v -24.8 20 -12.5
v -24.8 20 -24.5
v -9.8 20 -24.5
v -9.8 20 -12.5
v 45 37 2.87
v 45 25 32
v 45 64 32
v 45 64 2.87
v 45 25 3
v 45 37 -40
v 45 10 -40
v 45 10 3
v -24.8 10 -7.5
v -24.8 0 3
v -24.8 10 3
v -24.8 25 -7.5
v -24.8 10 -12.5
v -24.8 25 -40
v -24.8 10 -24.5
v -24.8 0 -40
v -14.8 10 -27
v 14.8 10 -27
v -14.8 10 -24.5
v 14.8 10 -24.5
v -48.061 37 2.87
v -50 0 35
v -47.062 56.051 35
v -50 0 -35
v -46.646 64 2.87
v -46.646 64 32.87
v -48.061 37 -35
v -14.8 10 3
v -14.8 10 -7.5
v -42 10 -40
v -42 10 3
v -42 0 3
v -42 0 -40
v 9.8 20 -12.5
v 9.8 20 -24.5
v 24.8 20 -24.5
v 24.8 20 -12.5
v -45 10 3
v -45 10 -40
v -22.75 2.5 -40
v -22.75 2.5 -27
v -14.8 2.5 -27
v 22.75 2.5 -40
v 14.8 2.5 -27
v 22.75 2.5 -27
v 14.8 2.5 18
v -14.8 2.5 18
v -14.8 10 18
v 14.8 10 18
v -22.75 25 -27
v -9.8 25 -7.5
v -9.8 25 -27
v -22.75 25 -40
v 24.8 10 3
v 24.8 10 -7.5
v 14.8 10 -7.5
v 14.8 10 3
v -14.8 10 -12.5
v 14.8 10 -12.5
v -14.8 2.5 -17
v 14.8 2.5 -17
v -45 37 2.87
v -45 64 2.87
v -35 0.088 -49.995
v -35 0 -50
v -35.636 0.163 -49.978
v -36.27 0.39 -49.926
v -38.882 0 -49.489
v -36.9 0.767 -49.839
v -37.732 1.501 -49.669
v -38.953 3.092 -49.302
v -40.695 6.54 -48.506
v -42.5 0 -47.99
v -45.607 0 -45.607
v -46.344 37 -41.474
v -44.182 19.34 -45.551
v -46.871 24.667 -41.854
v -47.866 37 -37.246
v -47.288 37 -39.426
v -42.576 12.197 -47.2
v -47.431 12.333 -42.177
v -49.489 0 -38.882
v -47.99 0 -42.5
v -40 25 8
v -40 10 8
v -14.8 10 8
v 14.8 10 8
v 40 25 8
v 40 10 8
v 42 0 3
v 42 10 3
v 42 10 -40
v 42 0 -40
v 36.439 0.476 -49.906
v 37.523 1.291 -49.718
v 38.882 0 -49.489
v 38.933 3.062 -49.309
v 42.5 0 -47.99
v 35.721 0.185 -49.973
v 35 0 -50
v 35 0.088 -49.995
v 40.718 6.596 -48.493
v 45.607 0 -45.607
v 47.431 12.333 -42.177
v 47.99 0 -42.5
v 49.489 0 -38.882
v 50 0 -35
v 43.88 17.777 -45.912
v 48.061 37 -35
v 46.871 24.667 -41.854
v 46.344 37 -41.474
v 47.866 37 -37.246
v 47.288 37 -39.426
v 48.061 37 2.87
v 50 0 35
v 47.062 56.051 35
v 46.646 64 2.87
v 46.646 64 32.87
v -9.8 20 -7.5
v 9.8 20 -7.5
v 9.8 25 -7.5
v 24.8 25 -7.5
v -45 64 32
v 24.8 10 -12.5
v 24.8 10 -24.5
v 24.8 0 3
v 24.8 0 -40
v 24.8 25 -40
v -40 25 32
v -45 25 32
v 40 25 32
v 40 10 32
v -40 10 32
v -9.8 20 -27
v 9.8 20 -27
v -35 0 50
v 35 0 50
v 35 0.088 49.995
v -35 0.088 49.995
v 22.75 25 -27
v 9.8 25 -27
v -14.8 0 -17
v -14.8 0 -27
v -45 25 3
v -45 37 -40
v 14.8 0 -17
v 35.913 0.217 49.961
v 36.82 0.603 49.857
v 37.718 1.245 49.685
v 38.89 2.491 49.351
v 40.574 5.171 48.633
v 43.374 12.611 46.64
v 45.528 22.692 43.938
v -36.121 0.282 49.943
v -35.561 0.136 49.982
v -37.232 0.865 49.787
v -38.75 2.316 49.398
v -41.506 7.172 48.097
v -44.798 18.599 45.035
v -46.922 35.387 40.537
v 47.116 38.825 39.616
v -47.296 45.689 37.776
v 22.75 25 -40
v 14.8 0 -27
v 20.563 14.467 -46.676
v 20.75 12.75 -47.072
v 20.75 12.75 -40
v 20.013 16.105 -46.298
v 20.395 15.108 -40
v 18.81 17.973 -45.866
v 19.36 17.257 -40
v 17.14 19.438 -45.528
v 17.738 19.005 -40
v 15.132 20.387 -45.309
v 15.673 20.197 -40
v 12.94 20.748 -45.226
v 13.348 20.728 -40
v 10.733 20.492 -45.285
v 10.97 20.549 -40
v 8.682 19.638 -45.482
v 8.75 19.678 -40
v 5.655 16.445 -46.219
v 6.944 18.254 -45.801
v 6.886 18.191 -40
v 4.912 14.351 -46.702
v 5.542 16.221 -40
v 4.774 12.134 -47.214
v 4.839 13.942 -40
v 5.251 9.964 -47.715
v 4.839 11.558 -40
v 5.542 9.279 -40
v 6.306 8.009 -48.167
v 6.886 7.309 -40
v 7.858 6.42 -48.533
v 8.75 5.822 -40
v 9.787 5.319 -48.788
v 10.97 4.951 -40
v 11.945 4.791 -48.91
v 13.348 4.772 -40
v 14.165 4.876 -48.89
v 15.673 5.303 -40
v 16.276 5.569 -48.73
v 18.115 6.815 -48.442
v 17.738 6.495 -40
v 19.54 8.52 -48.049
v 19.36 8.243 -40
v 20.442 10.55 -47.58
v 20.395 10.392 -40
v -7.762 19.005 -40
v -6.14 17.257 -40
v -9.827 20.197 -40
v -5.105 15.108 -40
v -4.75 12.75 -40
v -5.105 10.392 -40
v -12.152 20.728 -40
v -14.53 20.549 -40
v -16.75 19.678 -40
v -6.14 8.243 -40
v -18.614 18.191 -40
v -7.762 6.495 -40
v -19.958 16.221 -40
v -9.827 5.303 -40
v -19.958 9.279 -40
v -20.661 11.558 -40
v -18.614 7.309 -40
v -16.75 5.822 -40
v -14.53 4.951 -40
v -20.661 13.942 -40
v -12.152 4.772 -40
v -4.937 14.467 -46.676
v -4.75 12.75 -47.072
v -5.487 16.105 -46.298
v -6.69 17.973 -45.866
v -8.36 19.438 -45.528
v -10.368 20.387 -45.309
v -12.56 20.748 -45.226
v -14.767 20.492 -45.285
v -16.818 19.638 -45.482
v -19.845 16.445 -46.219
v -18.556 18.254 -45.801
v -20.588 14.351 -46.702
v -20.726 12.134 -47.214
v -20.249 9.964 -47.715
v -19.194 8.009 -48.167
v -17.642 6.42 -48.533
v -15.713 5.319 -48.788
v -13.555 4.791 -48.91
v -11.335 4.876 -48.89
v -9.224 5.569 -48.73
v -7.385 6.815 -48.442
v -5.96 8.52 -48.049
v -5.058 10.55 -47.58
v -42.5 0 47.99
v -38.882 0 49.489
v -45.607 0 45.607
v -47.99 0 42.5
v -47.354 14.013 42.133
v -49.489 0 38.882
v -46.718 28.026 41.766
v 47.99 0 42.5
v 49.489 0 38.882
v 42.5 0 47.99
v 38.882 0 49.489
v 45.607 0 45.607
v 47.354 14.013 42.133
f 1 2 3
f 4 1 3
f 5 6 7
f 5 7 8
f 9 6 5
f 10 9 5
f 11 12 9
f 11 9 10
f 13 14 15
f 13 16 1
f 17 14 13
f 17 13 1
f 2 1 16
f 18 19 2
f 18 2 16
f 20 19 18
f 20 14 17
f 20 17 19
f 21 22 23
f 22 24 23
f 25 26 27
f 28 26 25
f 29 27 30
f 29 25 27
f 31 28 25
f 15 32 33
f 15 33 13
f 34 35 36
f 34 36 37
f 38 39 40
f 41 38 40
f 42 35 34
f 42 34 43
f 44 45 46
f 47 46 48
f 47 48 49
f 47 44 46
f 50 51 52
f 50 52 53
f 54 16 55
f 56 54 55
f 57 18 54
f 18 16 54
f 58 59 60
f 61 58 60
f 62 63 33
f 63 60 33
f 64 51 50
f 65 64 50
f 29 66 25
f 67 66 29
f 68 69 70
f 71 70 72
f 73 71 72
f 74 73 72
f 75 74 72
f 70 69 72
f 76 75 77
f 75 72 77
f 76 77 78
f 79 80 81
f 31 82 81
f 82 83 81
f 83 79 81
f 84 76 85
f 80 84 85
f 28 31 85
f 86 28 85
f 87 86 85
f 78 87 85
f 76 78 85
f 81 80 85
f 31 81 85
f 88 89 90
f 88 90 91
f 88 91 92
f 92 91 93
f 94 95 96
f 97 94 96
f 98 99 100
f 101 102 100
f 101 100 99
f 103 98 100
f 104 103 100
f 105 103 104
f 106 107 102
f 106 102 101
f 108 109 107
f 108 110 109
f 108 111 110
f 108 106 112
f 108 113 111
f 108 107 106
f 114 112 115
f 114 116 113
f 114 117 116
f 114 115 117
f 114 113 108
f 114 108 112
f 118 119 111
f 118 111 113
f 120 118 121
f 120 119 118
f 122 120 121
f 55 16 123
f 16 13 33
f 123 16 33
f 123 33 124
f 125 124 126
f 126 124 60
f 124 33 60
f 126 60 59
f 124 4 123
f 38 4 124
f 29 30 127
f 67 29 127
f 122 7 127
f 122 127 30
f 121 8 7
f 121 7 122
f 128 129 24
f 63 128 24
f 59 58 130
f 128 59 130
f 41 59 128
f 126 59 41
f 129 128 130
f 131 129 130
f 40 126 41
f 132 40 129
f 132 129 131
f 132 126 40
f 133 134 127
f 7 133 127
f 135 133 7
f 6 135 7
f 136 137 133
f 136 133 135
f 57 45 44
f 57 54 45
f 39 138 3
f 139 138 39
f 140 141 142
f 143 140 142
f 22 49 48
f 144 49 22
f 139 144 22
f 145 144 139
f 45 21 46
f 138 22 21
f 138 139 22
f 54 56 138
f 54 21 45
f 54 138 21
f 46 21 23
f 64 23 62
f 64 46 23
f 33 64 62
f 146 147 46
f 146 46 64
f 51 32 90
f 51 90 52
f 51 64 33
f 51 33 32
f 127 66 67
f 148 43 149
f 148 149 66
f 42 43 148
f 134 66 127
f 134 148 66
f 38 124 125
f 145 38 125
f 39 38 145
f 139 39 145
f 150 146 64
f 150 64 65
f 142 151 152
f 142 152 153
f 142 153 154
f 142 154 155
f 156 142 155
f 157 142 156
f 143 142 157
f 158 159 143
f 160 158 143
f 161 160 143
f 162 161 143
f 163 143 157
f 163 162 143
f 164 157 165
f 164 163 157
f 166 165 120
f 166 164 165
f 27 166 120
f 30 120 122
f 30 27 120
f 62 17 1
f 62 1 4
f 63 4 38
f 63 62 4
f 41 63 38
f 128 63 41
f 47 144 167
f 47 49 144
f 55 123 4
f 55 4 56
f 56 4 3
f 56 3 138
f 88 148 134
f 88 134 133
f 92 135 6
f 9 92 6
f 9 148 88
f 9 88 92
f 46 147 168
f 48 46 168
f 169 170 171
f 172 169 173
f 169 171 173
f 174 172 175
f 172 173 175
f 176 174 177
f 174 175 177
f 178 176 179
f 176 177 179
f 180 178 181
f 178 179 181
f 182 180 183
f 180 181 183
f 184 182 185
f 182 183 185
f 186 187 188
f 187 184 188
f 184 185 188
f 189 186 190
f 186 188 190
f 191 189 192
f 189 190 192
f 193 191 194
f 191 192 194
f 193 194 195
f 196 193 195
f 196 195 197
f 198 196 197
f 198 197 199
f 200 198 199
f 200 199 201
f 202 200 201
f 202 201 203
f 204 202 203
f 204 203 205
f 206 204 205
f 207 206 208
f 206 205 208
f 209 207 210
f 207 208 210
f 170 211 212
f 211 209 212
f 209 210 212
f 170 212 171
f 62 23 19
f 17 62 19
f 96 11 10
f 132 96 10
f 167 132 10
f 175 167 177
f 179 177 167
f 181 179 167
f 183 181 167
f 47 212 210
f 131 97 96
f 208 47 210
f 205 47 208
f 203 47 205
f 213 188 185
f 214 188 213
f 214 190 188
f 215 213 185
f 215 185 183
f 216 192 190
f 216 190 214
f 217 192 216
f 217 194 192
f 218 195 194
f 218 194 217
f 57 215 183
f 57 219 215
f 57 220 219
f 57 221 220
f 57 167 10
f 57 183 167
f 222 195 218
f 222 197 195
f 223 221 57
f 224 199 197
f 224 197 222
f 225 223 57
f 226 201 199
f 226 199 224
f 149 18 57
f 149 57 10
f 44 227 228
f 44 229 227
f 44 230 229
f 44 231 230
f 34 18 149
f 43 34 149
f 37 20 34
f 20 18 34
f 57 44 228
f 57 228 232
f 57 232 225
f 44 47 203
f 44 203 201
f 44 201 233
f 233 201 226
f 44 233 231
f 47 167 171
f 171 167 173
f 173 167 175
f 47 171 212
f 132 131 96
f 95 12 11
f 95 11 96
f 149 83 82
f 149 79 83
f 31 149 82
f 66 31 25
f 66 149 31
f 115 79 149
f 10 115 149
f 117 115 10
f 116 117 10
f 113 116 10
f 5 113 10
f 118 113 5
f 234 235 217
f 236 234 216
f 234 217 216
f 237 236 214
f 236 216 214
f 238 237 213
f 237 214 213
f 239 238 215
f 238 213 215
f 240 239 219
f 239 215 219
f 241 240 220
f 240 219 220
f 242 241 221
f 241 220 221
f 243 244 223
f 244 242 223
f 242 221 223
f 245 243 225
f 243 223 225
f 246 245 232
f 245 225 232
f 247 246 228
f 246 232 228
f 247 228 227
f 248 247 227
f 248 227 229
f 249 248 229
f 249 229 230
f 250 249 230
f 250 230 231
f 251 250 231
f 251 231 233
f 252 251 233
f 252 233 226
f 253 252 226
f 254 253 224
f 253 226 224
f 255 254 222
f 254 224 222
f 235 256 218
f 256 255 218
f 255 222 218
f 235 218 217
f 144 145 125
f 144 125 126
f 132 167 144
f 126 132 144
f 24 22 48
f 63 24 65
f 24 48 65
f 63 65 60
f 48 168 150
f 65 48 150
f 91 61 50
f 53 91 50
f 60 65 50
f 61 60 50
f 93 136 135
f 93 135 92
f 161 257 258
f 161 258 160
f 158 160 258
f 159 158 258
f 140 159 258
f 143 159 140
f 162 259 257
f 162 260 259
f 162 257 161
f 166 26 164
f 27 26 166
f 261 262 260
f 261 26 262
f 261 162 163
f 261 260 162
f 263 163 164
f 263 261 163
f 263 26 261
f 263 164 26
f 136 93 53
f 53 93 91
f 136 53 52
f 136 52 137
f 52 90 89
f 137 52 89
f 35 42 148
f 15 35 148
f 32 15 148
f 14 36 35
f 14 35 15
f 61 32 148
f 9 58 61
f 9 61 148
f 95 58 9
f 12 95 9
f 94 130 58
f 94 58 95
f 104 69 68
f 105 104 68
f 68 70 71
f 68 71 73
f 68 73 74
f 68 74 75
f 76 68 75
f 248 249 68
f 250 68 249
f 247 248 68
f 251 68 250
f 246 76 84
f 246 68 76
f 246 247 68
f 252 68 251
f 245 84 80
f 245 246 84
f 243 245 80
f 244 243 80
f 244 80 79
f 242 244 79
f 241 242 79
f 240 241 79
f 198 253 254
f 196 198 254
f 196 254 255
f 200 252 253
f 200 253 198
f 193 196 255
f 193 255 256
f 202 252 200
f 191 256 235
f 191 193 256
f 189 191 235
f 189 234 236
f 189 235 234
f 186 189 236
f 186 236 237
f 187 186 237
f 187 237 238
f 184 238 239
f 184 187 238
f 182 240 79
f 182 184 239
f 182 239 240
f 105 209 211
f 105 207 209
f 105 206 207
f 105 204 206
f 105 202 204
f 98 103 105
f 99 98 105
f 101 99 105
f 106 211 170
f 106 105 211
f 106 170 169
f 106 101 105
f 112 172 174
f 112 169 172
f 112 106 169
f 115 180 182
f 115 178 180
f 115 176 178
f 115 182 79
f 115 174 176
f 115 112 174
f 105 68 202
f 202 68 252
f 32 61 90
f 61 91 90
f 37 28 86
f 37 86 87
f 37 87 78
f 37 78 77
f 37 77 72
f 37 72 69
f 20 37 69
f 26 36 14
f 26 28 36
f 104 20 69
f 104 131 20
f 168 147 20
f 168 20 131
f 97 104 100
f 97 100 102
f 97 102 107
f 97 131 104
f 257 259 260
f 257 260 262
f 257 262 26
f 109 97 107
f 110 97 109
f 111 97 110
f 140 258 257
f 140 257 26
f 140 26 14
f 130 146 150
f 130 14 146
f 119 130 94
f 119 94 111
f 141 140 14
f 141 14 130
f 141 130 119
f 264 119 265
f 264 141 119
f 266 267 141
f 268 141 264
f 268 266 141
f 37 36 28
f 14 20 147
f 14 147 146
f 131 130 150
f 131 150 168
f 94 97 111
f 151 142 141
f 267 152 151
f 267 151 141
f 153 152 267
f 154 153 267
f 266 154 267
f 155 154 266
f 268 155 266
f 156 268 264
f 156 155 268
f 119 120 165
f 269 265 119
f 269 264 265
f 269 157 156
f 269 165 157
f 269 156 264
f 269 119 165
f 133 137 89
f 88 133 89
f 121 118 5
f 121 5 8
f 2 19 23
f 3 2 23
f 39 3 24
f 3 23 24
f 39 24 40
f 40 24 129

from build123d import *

# Parameters (mm, degrees)
BOSS_EXTRUDE1_DEPTH     = 10
SKETCH2_W               = 17.2
SKETCH2_H               = 43
CUT_EXTRUDE1_DEPTH      = 72.414284285
SKETCH3_W               = 90
SKETCH3_H               = 34
SKETCH3_W_2             = 80
SKETCH3_H_2             = 24
BOSS_EXTRUDE3_DEPTH     = 15
SKETCH4_W               = 49.6
SKETCH4_H               = 5
BOSS_EXTRUDE4_DEPTH     = 10
SKETCH5_W               = 15
SKETCH5_H               = 22
BOSS_EXTRUDE5_DEPTH     = 5
SKETCH6_W               = 90
SKETCH6_H               = 77
BOSS_EXTRUDE6_DEPTH     = 15
BOSS_EXTRUDE8_DEPTH     = 39
CHAMFER1_SIZE           = 64
CHAMFER1_SIZE_2         = 3.354097874
CHAMFER2_SIZE           = 64
CHAMFER2_SIZE_2         = 11.405813635
CHAMFER3_SIZE           = 64
CHAMFER3_SIZE_2         = 13.775745352
CUT_EXTRUDE3_DEPTH      = 95.500525601
CUT_EXTRUDE3_DEPTH_BACK = 95.500525601
SKETCH10_W              = 50
SKETCH10_H              = 27
SKETCH11_W              = 45.5
SKETCH11_H              = 10.5
CUT_EXTRUDE4_DEPTH      = 7.5
SKETCH14_W              = 2.05
SKETCH14_H              = 10.5
BOSS_EXTRUDE9_DEPTH     = 15
SKETCH15_R              = 8
CUT_EXTRUDE5_DEPTH      = 122.227059686
CUT_EXTRUDE6_DEPTH      = 2.5
CUT_EXTRUDE7_REACH      = 97.373
SKETCH18_W              = 29.6
SKETCH18_H              = 45
CUT_EXTRUDE8_DEPTH      = 15
SKETCH21_W              = 29.6
SKETCH21_H              = 35
BOSS_EXTRUDE10_DEPTH    = 2.5


with BuildPart() as part:
    # Sketch1 → Boss-Extrude1 (new body)
    with BuildSketch(Plane(origin=(0, 0, 0), x_dir=(1, 0, 0), z_dir=(0, 1, 0))):
        with BuildLine():
            Line((-35, 50), (35, 50))
            ThreePointArc((35, 50), (45.606601718, 45.606601718), (50, 35))
            Line((50, 35), (50, -35))
            ThreePointArc((50, -35), (45.606601718, -45.606601718), (35, -50))
            Line((35, -50), (-35, -50))
            ThreePointArc((-35, -50), (-45.606601718, -45.606601718), (-50, -35))
            Line((-50, -35), (-50, 35))
            ThreePointArc((-50, 35), (-45.606601718, 45.606601718), (-35, 50))
        make_face()
    extrude(amount=BOSS_EXTRUDE1_DEPTH)

    # Sketch2 → Cut-Extrude1 (cut, through all)
    with BuildSketch(Plane(origin=(0, 10, 0), x_dir=(1, 0, 0), z_dir=(0, 1, 0))):
        with Locations((-33.4, 18.5)):
            Rectangle(SKETCH2_W, SKETCH2_H)
        with Locations((33.4, 18.5)):
            Rectangle(SKETCH2_W, SKETCH2_H)
    extrude(amount=-CUT_EXTRUDE1_DEPTH, mode=Mode.SUBTRACT)

    # Sketch3 → Boss-Extrude3 (add)
    with BuildSketch(Plane(origin=(0, 10, 0), x_dir=(1, 0, 0), z_dir=(0, 1, 0))):
        with Locations((0, -20)):
            Rectangle(SKETCH3_W, SKETCH3_H)
        with Locations((0, -20)):
            Rectangle(SKETCH3_W_2, SKETCH3_H_2, mode=Mode.SUBTRACT)
    extrude(amount=BOSS_EXTRUDE3_DEPTH)

    # Sketch4 → Boss-Extrude4 (add)
    with BuildSketch(Plane(origin=(0, 10, 0), x_dir=(1, 0, 0), z_dir=(0, 1, 0))):
        with Locations((0, 10)):
            Rectangle(SKETCH4_W, SKETCH4_H)
        with Locations((0, 27)):
            Rectangle(SKETCH4_W, SKETCH4_H)
    extrude(amount=BOSS_EXTRUDE4_DEPTH)

    # Sketch5 → Boss-Extrude5 (add)
    with BuildSketch(Plane(origin=(0, 20, 0), x_dir=(1, 0, 0), z_dir=(0, 1, 0))):
        with Locations((-17.3, 18.5)):
            Rectangle(SKETCH5_W, SKETCH5_H)
        with Locations((17.3, 18.5)):
            Rectangle(SKETCH5_W, SKETCH5_H)
    extrude(amount=BOSS_EXTRUDE5_DEPTH)

    # Sketch6 → Boss-Extrude6 (add)
    with BuildSketch(Plane(origin=(0, 10, 0), x_dir=(1, 0, 0), z_dir=(0, 1, 0))):
        with BuildLine():
            Line((-50, 35), (-50, -35))
            ThreePointArc((-50, -35), (-45.606601718, -45.606601718), (-35, -50))
            Line((-35, -50), (35, -50))
            ThreePointArc((35, -50), (45.606601718, -45.606601718), (50, -35))
            Line((50, -35), (50, 35))
            ThreePointArc((50, 35), (45.606601718, 45.606601718), (35, 50))
            Line((35, 50), (-35, 50))
            ThreePointArc((-35, 50), (-45.606601718, 45.606601718), (-50, 35))
        make_face()
        with Locations((0, 1.5)):
            Rectangle(SKETCH6_W, SKETCH6_H, mode=Mode.SUBTRACT)
    extrude(amount=BOSS_EXTRUDE6_DEPTH)

    # Sketch9 → Boss-Extrude8 (add)
    with BuildSketch(Plane(origin=(0, 25, 0), x_dir=(1, 0, 0), z_dir=(0, 1, 0))):
        with BuildLine():
            Line((-50, 35), (-50, -35))
            ThreePointArc((-50, -35), (-45.606601718, -45.606601718), (-35, -50))
            Line((-35, -50), (35, -50))
            ThreePointArc((35, -50), (45.606601718, -45.606601718), (50, -35))
            Line((50, -35), (50, 35))
            ThreePointArc((50, 35), (45.606601718, 45.606601718), (35, 50))
            Line((35, 50), (-35, 50))
            ThreePointArc((-35, 50), (-45.606601718, 45.606601718), (-50, 35))
        make_face()
        with BuildLine():
            Line((-45, 35), (-45, -32))
            Line((-45, -32), (45, -32))
            Line((45, -32), (45, 35))
            ThreePointArc((45, 35), (44.659258263, 37.588190451), (43.660254038, 40))
            Line((43.660254038, 40), (-43.660254038, 40))
            ThreePointArc((-43.660254038, 40), (-44.659258263, 37.588190451), (-45, 35))
        make_face(mode=Mode.SUBTRACT)
    extrude(amount=BOSS_EXTRUDE8_DEPTH)

    # Chamfer1
    # the kernel refuses this chamfer: 64, 3.354097874 mm, written as the material it takes off along each edge
    with BuildSketch(Plane(origin=(-35, 64, 50), x_dir=(0, -0.9999979738662979, 0.002013023422382214), z_dir=(1, 0, 0)), Plane(origin=(50, 64, 35), x_dir=(0.002013023422382214, -0.9999979738662979, 0), z_dir=(0, 0, -1)), Plane(origin=(-50, 64, -35), x_dir=(-0.002013023422382214, -0.9999979738662979, 0), z_dir=(0, 0, 1)), Plane(origin=(35, 64, -50), x_dir=(0, -0.9999979738662979, -0.002013023422382214), z_dir=(-1, 0, 0))) as chamfer1_piece_1:
        Polygon((CHAMFER1_SIZE * 0.999997973866, CHAMFER1_SIZE * 0.00201302342238), (-CHAMFER1_SIZE_2 * 0.00201302342245, CHAMFER1_SIZE_2 * 0.9999979739), (0, 0), align=None)
    extrude(amount=70, mode=Mode.SUBTRACT)
    with BuildSketch(Plane(origin=(35, 64, 35), x_dir=(0, 0, 1), z_dir=(-1, 0, 0))) as chamfer1_piece_2:
        Polygon((15, -CHAMFER1_SIZE), (15 - CHAMFER1_SIZE_2, 0), (15, 0), align=None)
    revolve(axis=Axis((35, 64, 35), (0, 1, 0)), revolution_arc=90, mode=Mode.SUBTRACT)
    with BuildSketch(Plane(origin=(-35, 64, 35), x_dir=(-1, 0, 0), z_dir=(0, 0, -1))) as chamfer1_piece_3:
        Polygon((15, -CHAMFER1_SIZE), (15 - CHAMFER1_SIZE_2, 0), (15, 0), align=None)
    revolve(axis=Axis((-35, 64, 35), (0, 1, 0)), revolution_arc=90, mode=Mode.SUBTRACT)
    with BuildSketch(Plane(origin=(35, 64, -35), x_dir=(1, 0, 0), z_dir=(0, 0, 1))) as chamfer1_piece_4:
        Polygon((15, -CHAMFER1_SIZE), (15 - CHAMFER1_SIZE_2, 0), (15, 0), align=None)
    revolve(axis=Axis((35, 64, -35), (0, 1, 0)), revolution_arc=90, mode=Mode.SUBTRACT)
    with BuildSketch(Plane(origin=(-35, 64, -35), x_dir=(0, 0, -1), z_dir=(1, 0, 0))) as chamfer1_piece_5:
        Polygon((15 - CHAMFER1_SIZE_2, 0), (15, -CHAMFER1_SIZE), (15, 0), align=None)
    revolve(axis=Axis((-35, 64, -35), (0, 1, 0)), revolution_arc=90, mode=Mode.SUBTRACT)

    # Chamfer2
    # the kernel refuses this chamfer: 64, 11.405813635 mm, written as the material it takes off along each edge
    with BuildSketch(Plane(origin=(201.306482971, 64, -46.645902126), x_dir=(0, -0.9982575003065525, -0.05900816114499234), z_dir=(-1, 0, 0))) as chamfer2_piece_1:
        Polygon((CHAMFER2_SIZE * 0.999977671636, CHAMFER2_SIZE * 0.0066825316561), (-CHAMFER2_SIZE_2 * 0.0590081611462, CHAMFER2_SIZE_2 * 0.998257500326), (0, 0), align=None)
    extrude(amount=402.612965942, mode=Mode.SUBTRACT)

    # Chamfer3
    # the kernel refuses this chamfer: 64, 13.775745352 mm, written as the material it takes off along each edge
    with BuildSketch(Plane(origin=(-201.265469314, 64, 46.645902126), x_dir=(0, -0.9981787050157903, 0.06032638604292662), z_dir=(1, 0, 0))) as chamfer3_piece_1:
        Polygon((CHAMFER3_SIZE * 0.999967974892, CHAMFER3_SIZE * 0.00800307379952), (-CHAMFER3_SIZE_2 * 0.060326386045, CHAMFER3_SIZE_2 * 0.99817870505), (0, 0), align=None)
    extrude(amount=402.530938629, mode=Mode.SUBTRACT)

    # Sketch10 → Cut-Extrude3 (cut, two sides: drawn at the far end of the back side and taken through both)
    with BuildSketch(Plane(origin=(0, 1.307501734, 0), x_dir=(0, 0, 1), z_dir=(-1, 0, 0)).offset(-CUT_EXTRUDE3_DEPTH_BACK)):
        with Locations((-22.129843227, 49.192498266)):
            Rectangle(SKETCH10_W, SKETCH10_H)
    extrude(amount=CUT_EXTRUDE3_DEPTH + CUT_EXTRUDE3_DEPTH_BACK, mode=Mode.SUBTRACT)

    # Sketch11 → Cut-Extrude4 (cut)
    with BuildSketch(Plane(origin=(0, 10, 0), x_dir=(1, 0, 0), z_dir=(0, 1, 0))):
        with Locations((0, 34.75)):
            Rectangle(SKETCH11_W, SKETCH11_H)
    extrude(amount=-CUT_EXTRUDE4_DEPTH, mode=Mode.SUBTRACT)

    # Sketch14 → Boss-Extrude9 (add)
    with BuildSketch(Plane(origin=(0, 10, 0), x_dir=(1, 0, 0), z_dir=(0, 1, 0))):
        with Locations((-23.775, 34.75)):
            Rectangle(SKETCH14_W, SKETCH14_H)
        with Locations((23.775, 34.75)):
            Rectangle(SKETCH14_W, SKETCH14_H)
    extrude(amount=BOSS_EXTRUDE9_DEPTH)

    # Sketch15 → Cut-Extrude5 (cut, through all)
    with BuildSketch(Plane.XY.offset(-40)):
        with Locations((-12.75, 12.75)):
            Circle(SKETCH15_R)
        with Locations((12.75, 12.75)):
            Circle(SKETCH15_R)
    extrude(amount=-CUT_EXTRUDE5_DEPTH, mode=Mode.SUBTRACT)

    # Sketch17 → Cut-Extrude6 (cut)
    with BuildSketch(Plane(origin=(0, 0, -29.5), x_dir=(-1, 0, 0), z_dir=(0, 0, -1))):
        Polygon((-9.8, 25), (-22.75, 25), (-22.75, 2.5), (22.75, 2.5), (22.75, 25), (9.8, 25), (9.8, 20), (-9.8, 20), align=None)
    extrude(amount=-CUT_EXTRUDE6_DEPTH, mode=Mode.SUBTRACT)

    # Cut-Extrude7: up to this face of the body (flat: up to its plane)
    cut_extrude7_end = Plane(part.part.faces().sort_by_distance((0, 10, -18.5))[0])
    # Sketch18 → Cut-Extrude7 (cut, up to the picked face)
    with BuildSketch(Plane.XZ, mode=Mode.PRIVATE) as cut_extrude7_sk1:
        with Locations((0, -4.5)):
            Rectangle(SKETCH18_W, SKETCH18_H)
    cut_extrude7_tool1 = split(extrude(cut_extrude7_sk1.sketch, amount=-CUT_EXTRUDE7_REACH, mode=Mode.PRIVATE), bisect_by=cut_extrude7_end, keep=Keep.BOTH, mode=Mode.PRIVATE)
    add(cut_extrude7_tool1.solids().sort_by(Axis((0, 0, -4.5), (0, 1, 0)))[0], mode=Mode.SUBTRACT)

    # Sketch20 → Cut-Extrude8 (cut)
    with BuildSketch(Plane.XZ.offset(-25)):
        with BuildLine():
            Line((-45, -35), (-45, -40))
            Line((-45, -40), (-43.660254038, -40))
            ThreePointArc((-43.660254038, -40), (-44.659258263, -37.588190451), (-45, -35))
        make_face()
        with BuildLine():
            Line((45, -40), (45, -35))
            ThreePointArc((45, -35), (44.659258263, -37.588190451), (43.660254038, -40))
            Line((43.660254038, -40), (45, -40))
        make_face()
    extrude(amount=-CUT_EXTRUDE8_DEPTH, mode=Mode.SUBTRACT)

    # Sketch21 → Boss-Extrude10 (add)
    with BuildSketch(Plane.XZ):
        with Locations((0, 0.5)):
            Rectangle(SKETCH21_W, SKETCH21_H)
    extrude(amount=-BOSS_EXTRUDE10_DEPTH)


solid = part.part
